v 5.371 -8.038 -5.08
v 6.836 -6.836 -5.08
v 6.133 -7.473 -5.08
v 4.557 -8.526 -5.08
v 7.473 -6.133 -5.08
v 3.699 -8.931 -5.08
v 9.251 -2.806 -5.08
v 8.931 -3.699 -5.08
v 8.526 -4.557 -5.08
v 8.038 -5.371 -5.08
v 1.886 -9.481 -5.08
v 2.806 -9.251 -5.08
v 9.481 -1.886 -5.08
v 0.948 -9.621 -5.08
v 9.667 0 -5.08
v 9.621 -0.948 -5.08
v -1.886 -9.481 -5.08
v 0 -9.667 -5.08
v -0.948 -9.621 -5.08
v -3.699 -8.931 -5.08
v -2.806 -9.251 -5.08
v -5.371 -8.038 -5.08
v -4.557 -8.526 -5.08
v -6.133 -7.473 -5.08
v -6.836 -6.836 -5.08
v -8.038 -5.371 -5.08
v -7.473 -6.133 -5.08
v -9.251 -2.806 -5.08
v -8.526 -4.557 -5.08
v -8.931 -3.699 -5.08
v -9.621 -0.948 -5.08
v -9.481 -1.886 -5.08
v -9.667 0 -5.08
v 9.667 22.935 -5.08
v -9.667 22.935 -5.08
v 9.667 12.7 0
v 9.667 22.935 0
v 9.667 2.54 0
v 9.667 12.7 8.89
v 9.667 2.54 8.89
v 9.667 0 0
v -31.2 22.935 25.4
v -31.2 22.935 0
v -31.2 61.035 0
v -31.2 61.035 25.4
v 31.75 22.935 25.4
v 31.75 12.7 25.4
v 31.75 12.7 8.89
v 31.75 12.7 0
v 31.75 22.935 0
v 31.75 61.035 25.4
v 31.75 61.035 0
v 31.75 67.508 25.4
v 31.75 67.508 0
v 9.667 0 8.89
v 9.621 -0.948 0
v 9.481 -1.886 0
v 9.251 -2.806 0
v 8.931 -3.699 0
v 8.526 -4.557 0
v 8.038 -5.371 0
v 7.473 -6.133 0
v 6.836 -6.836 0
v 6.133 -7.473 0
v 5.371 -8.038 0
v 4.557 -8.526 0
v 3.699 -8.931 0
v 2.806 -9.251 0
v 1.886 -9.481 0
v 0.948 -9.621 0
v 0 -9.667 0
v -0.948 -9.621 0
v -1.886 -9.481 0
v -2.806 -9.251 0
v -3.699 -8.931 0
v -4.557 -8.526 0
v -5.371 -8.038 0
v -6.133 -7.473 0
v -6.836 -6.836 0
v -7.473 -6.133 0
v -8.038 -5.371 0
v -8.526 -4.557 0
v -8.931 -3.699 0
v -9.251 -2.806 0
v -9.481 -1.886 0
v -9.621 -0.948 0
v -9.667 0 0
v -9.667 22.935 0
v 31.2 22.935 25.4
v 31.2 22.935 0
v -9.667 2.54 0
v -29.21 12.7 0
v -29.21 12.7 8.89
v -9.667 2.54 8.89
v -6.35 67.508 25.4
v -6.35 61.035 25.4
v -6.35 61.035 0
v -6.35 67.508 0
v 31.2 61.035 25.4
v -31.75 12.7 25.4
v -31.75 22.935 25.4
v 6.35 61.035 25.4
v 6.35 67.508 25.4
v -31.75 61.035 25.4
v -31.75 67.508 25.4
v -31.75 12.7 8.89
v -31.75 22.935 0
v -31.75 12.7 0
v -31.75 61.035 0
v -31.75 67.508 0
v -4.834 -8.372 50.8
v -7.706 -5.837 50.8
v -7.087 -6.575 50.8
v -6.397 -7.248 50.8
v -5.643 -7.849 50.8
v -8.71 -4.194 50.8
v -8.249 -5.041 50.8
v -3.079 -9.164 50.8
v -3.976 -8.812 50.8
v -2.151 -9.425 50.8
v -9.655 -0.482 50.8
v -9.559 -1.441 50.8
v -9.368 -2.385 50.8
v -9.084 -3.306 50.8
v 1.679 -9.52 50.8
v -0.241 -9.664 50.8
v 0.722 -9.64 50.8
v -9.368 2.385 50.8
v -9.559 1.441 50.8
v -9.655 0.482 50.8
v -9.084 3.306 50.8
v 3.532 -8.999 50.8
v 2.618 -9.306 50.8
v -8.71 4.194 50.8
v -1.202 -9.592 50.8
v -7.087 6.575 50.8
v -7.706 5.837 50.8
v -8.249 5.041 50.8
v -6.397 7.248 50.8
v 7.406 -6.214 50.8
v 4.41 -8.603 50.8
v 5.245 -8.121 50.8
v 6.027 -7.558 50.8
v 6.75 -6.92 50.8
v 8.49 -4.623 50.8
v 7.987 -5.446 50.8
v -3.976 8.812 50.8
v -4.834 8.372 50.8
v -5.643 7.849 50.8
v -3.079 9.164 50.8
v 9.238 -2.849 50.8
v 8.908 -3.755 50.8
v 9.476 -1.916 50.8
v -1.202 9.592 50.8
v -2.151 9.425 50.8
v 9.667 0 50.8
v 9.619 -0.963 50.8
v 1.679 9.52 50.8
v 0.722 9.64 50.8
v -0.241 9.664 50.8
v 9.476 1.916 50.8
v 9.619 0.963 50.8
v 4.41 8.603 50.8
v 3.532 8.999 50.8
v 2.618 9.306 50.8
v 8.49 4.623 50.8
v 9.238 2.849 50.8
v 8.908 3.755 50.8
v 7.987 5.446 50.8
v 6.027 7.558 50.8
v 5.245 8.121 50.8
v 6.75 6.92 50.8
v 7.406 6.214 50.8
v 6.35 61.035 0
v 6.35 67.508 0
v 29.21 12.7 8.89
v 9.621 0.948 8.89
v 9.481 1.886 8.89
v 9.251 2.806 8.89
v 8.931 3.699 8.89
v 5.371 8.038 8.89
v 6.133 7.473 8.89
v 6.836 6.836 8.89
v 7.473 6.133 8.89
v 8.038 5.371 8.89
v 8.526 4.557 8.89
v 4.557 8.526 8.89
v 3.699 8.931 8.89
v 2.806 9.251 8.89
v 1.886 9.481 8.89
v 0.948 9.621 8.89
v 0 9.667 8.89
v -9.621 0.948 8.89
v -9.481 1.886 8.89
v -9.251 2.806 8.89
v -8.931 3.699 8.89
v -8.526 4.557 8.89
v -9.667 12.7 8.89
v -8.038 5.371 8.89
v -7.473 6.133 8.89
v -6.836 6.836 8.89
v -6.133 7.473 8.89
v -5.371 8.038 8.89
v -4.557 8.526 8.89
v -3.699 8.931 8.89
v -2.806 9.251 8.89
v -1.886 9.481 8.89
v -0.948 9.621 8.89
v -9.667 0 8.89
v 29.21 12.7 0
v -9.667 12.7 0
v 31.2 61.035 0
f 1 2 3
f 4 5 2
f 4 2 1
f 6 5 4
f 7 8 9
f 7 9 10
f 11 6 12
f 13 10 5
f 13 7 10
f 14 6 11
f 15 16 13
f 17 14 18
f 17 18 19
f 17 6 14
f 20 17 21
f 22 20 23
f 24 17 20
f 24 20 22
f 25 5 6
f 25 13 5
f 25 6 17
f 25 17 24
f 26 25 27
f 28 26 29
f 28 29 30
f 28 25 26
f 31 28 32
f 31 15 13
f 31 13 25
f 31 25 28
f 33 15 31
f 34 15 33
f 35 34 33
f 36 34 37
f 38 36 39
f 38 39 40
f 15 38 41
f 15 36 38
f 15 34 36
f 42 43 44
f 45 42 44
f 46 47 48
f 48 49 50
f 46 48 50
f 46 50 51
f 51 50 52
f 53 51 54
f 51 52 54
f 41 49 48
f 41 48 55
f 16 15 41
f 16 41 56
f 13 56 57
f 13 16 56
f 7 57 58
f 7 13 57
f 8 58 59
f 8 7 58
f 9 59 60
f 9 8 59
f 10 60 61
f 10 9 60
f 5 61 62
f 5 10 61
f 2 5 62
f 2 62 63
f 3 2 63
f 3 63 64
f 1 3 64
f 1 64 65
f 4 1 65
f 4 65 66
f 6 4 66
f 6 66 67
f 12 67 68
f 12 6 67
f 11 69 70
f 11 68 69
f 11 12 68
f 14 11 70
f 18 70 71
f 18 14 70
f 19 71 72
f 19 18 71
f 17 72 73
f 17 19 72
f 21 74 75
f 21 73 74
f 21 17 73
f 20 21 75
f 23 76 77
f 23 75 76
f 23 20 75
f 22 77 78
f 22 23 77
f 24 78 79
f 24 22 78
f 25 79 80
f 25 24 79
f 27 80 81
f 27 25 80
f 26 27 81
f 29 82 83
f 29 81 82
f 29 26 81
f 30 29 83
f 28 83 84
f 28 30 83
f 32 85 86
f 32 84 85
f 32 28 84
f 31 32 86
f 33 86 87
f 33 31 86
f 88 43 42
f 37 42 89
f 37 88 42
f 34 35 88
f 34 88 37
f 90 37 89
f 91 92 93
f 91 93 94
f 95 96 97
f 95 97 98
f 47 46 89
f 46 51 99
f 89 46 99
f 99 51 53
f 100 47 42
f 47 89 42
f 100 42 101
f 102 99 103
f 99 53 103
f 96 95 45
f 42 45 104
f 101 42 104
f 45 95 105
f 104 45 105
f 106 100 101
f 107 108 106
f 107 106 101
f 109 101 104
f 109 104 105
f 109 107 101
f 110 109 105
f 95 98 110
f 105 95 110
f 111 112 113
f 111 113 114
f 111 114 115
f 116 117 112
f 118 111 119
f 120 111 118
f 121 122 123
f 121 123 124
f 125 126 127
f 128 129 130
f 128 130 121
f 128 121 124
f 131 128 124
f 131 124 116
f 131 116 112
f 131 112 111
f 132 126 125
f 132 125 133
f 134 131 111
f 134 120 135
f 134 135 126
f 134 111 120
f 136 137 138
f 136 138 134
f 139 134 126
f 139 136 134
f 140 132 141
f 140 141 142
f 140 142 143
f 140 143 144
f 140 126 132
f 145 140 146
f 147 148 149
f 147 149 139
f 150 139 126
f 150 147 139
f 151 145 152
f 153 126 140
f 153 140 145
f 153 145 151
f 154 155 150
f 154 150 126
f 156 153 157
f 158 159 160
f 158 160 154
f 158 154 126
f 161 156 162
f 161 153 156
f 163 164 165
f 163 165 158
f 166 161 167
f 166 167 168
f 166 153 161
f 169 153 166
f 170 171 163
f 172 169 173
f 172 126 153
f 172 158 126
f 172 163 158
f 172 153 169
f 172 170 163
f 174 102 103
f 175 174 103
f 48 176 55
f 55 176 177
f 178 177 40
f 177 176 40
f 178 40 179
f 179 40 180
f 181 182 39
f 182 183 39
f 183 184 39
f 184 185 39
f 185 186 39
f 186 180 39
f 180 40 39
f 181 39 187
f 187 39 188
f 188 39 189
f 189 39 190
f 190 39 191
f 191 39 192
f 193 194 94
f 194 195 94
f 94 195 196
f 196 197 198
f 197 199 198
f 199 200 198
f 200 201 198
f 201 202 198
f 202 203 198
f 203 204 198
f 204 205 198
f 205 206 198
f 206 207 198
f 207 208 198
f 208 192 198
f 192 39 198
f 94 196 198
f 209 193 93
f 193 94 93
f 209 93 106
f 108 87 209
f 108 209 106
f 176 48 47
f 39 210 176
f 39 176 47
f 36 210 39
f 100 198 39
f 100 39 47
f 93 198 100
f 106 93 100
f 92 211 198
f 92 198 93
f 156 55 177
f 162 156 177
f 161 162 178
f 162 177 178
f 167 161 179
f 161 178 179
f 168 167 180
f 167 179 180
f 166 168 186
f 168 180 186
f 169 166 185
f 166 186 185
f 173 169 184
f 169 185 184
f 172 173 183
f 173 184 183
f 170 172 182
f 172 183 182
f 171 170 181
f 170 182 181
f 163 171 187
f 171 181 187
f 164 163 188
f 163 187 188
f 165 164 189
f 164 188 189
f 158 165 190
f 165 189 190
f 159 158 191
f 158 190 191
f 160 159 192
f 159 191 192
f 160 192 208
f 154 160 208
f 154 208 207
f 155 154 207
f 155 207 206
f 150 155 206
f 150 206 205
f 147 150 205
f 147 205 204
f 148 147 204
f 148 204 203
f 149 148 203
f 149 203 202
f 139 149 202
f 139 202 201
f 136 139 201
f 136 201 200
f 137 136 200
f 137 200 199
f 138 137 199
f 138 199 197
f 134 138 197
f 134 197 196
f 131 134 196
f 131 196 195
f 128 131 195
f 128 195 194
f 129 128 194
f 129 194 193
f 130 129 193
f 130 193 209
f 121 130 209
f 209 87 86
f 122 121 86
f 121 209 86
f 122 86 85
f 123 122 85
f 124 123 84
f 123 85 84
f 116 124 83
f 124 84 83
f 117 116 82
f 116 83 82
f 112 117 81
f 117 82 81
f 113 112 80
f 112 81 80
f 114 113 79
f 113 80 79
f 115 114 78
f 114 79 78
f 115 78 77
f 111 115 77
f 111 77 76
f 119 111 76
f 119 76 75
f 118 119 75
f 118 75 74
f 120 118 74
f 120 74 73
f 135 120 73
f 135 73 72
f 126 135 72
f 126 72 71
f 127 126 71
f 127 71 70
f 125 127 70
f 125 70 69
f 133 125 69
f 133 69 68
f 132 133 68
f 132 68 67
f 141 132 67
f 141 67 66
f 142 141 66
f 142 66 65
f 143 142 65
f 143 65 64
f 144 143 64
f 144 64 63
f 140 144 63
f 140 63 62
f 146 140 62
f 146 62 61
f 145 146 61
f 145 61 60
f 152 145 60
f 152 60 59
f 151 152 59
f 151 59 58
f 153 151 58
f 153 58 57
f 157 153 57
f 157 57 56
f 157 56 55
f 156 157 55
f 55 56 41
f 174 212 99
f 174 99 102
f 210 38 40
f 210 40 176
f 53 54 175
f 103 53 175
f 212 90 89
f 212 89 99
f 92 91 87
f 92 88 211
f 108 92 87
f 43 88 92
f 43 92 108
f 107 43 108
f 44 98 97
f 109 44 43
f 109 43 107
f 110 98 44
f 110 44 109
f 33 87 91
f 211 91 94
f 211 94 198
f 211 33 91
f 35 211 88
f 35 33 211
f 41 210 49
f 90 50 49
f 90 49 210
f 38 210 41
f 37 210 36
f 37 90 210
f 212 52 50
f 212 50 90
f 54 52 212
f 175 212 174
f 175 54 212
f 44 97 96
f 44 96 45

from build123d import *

# Parameters (mm, degrees)
SKETCH1_R           = 9.667215137
BOSS_EXTRUDE1_DEPTH = 50.8
SKETCH2_W           = 19.334430274
SKETCH2_H           = 12.7
BOSS_EXTRUDE2_DEPTH = 8.89
BOSS_EXTRUDE3_DEPTH = 25.4
SKETCH5_W           = 0.549916313
SKETCH5_H           = 38.1
BOSS_EXTRUDE4_DEPTH = 25.4
SKETCH6_W           = 25.4
SKETCH6_H           = 6.473300788
BOSS_EXTRUDE5_DEPTH = 25.4
BOSS_EXTRUDE6_DEPTH = 8.89
BOSS_EXTRUDE7_START = 5.08
BOSS_EXTRUDE7_DEPTH = 5.08


with BuildPart() as part:
    # Sketch1 → Boss-Extrude1 (new body)
    with BuildSketch(Plane.XY):
        Circle(SKETCH1_R)
    extrude(amount=BOSS_EXTRUDE1_DEPTH)

    # Sketch2 → Boss-Extrude2 (add)
    with BuildSketch(Plane(origin=(0, 0, 0), x_dir=(-1, 0, 0), z_dir=(0, 0, -1))):
        with Locations((0, 6.35)):
            Rectangle(SKETCH2_W, SKETCH2_H)
    extrude(amount=-BOSS_EXTRUDE2_DEPTH)

    # Sketch4 → Boss-Extrude3 (add)
    with BuildSketch(Plane(origin=(0, 0, 0), x_dir=(-1, 0, 0), z_dir=(0, 0, -1))):
        Polygon((-31.75, 12.7), (-31.75, 22.935187234), (31.75, 22.935187234), (31.75, 12.7), (9.667215137, 12.7), (-9.667215137, 12.7), align=None)
    extrude(amount=-BOSS_EXTRUDE3_DEPTH)

    # Sketch5 → Boss-Extrude4 (add)
    with BuildSketch(Plane(origin=(0, 0, 0), x_dir=(-1, 0, 0), z_dir=(0, 0, -1))):
        with Locations((31.475041844, 41.985187234)):
            Rectangle(SKETCH5_W, SKETCH5_H)
        with Locations((-31.475041844, 41.985187234)):
            Rectangle(SKETCH5_W, SKETCH5_H)
    extrude(amount=-BOSS_EXTRUDE4_DEPTH)

    # Sketch6 → Boss-Extrude5 (add)
    with BuildSketch(Plane(origin=(0, 0, 0), x_dir=(-1, 0, 0), z_dir=(0, 0, -1))):
        with Locations((19.05, 64.271837628)):
            Rectangle(SKETCH6_W, SKETCH6_H)
        with Locations((-19.05, 64.271837628)):
            Rectangle(SKETCH6_W, SKETCH6_H)
    extrude(amount=-BOSS_EXTRUDE5_DEPTH)

    # Sketch7 → Boss-Extrude6 (add)
    with BuildSketch(Plane(origin=(0, 0, 0), x_dir=(-1, 0, 0), z_dir=(0, 0, -1))):
        Polygon((-31.75, 12.7), (-9.667215137, 0), (-9.667215137, 2.54), (-29.21, 12.7), align=None)
        Polygon((9.667215137, 0), (31.75, 12.7), (29.21, 12.7), (9.667215137, 2.54), align=None)
    extrude(amount=-BOSS_EXTRUDE6_DEPTH)

    # Sketch14 → Boss-Extrude7 (add)
    with BuildSketch(Plane(origin=(0, 0, 0), x_dir=(-1, 0, 0), z_dir=(0, 0, -1)).offset(BOSS_EXTRUDE7_START)):
        with BuildLine():
            Line((9.667215137, 22.935187234), (-9.667215137, 22.935187234))
            Line((-9.667215137, 22.935187234), (-9.667215137, 0))
            ThreePointArc((-9.667215137, 0), (0, -9.667215137), (9.667215137, 0))
            Line((9.667215137, 0), (9.667215137, 22.935187234))
        make_face()
    extrude(amount=-BOSS_EXTRUDE7_DEPTH)


solid = part.part
